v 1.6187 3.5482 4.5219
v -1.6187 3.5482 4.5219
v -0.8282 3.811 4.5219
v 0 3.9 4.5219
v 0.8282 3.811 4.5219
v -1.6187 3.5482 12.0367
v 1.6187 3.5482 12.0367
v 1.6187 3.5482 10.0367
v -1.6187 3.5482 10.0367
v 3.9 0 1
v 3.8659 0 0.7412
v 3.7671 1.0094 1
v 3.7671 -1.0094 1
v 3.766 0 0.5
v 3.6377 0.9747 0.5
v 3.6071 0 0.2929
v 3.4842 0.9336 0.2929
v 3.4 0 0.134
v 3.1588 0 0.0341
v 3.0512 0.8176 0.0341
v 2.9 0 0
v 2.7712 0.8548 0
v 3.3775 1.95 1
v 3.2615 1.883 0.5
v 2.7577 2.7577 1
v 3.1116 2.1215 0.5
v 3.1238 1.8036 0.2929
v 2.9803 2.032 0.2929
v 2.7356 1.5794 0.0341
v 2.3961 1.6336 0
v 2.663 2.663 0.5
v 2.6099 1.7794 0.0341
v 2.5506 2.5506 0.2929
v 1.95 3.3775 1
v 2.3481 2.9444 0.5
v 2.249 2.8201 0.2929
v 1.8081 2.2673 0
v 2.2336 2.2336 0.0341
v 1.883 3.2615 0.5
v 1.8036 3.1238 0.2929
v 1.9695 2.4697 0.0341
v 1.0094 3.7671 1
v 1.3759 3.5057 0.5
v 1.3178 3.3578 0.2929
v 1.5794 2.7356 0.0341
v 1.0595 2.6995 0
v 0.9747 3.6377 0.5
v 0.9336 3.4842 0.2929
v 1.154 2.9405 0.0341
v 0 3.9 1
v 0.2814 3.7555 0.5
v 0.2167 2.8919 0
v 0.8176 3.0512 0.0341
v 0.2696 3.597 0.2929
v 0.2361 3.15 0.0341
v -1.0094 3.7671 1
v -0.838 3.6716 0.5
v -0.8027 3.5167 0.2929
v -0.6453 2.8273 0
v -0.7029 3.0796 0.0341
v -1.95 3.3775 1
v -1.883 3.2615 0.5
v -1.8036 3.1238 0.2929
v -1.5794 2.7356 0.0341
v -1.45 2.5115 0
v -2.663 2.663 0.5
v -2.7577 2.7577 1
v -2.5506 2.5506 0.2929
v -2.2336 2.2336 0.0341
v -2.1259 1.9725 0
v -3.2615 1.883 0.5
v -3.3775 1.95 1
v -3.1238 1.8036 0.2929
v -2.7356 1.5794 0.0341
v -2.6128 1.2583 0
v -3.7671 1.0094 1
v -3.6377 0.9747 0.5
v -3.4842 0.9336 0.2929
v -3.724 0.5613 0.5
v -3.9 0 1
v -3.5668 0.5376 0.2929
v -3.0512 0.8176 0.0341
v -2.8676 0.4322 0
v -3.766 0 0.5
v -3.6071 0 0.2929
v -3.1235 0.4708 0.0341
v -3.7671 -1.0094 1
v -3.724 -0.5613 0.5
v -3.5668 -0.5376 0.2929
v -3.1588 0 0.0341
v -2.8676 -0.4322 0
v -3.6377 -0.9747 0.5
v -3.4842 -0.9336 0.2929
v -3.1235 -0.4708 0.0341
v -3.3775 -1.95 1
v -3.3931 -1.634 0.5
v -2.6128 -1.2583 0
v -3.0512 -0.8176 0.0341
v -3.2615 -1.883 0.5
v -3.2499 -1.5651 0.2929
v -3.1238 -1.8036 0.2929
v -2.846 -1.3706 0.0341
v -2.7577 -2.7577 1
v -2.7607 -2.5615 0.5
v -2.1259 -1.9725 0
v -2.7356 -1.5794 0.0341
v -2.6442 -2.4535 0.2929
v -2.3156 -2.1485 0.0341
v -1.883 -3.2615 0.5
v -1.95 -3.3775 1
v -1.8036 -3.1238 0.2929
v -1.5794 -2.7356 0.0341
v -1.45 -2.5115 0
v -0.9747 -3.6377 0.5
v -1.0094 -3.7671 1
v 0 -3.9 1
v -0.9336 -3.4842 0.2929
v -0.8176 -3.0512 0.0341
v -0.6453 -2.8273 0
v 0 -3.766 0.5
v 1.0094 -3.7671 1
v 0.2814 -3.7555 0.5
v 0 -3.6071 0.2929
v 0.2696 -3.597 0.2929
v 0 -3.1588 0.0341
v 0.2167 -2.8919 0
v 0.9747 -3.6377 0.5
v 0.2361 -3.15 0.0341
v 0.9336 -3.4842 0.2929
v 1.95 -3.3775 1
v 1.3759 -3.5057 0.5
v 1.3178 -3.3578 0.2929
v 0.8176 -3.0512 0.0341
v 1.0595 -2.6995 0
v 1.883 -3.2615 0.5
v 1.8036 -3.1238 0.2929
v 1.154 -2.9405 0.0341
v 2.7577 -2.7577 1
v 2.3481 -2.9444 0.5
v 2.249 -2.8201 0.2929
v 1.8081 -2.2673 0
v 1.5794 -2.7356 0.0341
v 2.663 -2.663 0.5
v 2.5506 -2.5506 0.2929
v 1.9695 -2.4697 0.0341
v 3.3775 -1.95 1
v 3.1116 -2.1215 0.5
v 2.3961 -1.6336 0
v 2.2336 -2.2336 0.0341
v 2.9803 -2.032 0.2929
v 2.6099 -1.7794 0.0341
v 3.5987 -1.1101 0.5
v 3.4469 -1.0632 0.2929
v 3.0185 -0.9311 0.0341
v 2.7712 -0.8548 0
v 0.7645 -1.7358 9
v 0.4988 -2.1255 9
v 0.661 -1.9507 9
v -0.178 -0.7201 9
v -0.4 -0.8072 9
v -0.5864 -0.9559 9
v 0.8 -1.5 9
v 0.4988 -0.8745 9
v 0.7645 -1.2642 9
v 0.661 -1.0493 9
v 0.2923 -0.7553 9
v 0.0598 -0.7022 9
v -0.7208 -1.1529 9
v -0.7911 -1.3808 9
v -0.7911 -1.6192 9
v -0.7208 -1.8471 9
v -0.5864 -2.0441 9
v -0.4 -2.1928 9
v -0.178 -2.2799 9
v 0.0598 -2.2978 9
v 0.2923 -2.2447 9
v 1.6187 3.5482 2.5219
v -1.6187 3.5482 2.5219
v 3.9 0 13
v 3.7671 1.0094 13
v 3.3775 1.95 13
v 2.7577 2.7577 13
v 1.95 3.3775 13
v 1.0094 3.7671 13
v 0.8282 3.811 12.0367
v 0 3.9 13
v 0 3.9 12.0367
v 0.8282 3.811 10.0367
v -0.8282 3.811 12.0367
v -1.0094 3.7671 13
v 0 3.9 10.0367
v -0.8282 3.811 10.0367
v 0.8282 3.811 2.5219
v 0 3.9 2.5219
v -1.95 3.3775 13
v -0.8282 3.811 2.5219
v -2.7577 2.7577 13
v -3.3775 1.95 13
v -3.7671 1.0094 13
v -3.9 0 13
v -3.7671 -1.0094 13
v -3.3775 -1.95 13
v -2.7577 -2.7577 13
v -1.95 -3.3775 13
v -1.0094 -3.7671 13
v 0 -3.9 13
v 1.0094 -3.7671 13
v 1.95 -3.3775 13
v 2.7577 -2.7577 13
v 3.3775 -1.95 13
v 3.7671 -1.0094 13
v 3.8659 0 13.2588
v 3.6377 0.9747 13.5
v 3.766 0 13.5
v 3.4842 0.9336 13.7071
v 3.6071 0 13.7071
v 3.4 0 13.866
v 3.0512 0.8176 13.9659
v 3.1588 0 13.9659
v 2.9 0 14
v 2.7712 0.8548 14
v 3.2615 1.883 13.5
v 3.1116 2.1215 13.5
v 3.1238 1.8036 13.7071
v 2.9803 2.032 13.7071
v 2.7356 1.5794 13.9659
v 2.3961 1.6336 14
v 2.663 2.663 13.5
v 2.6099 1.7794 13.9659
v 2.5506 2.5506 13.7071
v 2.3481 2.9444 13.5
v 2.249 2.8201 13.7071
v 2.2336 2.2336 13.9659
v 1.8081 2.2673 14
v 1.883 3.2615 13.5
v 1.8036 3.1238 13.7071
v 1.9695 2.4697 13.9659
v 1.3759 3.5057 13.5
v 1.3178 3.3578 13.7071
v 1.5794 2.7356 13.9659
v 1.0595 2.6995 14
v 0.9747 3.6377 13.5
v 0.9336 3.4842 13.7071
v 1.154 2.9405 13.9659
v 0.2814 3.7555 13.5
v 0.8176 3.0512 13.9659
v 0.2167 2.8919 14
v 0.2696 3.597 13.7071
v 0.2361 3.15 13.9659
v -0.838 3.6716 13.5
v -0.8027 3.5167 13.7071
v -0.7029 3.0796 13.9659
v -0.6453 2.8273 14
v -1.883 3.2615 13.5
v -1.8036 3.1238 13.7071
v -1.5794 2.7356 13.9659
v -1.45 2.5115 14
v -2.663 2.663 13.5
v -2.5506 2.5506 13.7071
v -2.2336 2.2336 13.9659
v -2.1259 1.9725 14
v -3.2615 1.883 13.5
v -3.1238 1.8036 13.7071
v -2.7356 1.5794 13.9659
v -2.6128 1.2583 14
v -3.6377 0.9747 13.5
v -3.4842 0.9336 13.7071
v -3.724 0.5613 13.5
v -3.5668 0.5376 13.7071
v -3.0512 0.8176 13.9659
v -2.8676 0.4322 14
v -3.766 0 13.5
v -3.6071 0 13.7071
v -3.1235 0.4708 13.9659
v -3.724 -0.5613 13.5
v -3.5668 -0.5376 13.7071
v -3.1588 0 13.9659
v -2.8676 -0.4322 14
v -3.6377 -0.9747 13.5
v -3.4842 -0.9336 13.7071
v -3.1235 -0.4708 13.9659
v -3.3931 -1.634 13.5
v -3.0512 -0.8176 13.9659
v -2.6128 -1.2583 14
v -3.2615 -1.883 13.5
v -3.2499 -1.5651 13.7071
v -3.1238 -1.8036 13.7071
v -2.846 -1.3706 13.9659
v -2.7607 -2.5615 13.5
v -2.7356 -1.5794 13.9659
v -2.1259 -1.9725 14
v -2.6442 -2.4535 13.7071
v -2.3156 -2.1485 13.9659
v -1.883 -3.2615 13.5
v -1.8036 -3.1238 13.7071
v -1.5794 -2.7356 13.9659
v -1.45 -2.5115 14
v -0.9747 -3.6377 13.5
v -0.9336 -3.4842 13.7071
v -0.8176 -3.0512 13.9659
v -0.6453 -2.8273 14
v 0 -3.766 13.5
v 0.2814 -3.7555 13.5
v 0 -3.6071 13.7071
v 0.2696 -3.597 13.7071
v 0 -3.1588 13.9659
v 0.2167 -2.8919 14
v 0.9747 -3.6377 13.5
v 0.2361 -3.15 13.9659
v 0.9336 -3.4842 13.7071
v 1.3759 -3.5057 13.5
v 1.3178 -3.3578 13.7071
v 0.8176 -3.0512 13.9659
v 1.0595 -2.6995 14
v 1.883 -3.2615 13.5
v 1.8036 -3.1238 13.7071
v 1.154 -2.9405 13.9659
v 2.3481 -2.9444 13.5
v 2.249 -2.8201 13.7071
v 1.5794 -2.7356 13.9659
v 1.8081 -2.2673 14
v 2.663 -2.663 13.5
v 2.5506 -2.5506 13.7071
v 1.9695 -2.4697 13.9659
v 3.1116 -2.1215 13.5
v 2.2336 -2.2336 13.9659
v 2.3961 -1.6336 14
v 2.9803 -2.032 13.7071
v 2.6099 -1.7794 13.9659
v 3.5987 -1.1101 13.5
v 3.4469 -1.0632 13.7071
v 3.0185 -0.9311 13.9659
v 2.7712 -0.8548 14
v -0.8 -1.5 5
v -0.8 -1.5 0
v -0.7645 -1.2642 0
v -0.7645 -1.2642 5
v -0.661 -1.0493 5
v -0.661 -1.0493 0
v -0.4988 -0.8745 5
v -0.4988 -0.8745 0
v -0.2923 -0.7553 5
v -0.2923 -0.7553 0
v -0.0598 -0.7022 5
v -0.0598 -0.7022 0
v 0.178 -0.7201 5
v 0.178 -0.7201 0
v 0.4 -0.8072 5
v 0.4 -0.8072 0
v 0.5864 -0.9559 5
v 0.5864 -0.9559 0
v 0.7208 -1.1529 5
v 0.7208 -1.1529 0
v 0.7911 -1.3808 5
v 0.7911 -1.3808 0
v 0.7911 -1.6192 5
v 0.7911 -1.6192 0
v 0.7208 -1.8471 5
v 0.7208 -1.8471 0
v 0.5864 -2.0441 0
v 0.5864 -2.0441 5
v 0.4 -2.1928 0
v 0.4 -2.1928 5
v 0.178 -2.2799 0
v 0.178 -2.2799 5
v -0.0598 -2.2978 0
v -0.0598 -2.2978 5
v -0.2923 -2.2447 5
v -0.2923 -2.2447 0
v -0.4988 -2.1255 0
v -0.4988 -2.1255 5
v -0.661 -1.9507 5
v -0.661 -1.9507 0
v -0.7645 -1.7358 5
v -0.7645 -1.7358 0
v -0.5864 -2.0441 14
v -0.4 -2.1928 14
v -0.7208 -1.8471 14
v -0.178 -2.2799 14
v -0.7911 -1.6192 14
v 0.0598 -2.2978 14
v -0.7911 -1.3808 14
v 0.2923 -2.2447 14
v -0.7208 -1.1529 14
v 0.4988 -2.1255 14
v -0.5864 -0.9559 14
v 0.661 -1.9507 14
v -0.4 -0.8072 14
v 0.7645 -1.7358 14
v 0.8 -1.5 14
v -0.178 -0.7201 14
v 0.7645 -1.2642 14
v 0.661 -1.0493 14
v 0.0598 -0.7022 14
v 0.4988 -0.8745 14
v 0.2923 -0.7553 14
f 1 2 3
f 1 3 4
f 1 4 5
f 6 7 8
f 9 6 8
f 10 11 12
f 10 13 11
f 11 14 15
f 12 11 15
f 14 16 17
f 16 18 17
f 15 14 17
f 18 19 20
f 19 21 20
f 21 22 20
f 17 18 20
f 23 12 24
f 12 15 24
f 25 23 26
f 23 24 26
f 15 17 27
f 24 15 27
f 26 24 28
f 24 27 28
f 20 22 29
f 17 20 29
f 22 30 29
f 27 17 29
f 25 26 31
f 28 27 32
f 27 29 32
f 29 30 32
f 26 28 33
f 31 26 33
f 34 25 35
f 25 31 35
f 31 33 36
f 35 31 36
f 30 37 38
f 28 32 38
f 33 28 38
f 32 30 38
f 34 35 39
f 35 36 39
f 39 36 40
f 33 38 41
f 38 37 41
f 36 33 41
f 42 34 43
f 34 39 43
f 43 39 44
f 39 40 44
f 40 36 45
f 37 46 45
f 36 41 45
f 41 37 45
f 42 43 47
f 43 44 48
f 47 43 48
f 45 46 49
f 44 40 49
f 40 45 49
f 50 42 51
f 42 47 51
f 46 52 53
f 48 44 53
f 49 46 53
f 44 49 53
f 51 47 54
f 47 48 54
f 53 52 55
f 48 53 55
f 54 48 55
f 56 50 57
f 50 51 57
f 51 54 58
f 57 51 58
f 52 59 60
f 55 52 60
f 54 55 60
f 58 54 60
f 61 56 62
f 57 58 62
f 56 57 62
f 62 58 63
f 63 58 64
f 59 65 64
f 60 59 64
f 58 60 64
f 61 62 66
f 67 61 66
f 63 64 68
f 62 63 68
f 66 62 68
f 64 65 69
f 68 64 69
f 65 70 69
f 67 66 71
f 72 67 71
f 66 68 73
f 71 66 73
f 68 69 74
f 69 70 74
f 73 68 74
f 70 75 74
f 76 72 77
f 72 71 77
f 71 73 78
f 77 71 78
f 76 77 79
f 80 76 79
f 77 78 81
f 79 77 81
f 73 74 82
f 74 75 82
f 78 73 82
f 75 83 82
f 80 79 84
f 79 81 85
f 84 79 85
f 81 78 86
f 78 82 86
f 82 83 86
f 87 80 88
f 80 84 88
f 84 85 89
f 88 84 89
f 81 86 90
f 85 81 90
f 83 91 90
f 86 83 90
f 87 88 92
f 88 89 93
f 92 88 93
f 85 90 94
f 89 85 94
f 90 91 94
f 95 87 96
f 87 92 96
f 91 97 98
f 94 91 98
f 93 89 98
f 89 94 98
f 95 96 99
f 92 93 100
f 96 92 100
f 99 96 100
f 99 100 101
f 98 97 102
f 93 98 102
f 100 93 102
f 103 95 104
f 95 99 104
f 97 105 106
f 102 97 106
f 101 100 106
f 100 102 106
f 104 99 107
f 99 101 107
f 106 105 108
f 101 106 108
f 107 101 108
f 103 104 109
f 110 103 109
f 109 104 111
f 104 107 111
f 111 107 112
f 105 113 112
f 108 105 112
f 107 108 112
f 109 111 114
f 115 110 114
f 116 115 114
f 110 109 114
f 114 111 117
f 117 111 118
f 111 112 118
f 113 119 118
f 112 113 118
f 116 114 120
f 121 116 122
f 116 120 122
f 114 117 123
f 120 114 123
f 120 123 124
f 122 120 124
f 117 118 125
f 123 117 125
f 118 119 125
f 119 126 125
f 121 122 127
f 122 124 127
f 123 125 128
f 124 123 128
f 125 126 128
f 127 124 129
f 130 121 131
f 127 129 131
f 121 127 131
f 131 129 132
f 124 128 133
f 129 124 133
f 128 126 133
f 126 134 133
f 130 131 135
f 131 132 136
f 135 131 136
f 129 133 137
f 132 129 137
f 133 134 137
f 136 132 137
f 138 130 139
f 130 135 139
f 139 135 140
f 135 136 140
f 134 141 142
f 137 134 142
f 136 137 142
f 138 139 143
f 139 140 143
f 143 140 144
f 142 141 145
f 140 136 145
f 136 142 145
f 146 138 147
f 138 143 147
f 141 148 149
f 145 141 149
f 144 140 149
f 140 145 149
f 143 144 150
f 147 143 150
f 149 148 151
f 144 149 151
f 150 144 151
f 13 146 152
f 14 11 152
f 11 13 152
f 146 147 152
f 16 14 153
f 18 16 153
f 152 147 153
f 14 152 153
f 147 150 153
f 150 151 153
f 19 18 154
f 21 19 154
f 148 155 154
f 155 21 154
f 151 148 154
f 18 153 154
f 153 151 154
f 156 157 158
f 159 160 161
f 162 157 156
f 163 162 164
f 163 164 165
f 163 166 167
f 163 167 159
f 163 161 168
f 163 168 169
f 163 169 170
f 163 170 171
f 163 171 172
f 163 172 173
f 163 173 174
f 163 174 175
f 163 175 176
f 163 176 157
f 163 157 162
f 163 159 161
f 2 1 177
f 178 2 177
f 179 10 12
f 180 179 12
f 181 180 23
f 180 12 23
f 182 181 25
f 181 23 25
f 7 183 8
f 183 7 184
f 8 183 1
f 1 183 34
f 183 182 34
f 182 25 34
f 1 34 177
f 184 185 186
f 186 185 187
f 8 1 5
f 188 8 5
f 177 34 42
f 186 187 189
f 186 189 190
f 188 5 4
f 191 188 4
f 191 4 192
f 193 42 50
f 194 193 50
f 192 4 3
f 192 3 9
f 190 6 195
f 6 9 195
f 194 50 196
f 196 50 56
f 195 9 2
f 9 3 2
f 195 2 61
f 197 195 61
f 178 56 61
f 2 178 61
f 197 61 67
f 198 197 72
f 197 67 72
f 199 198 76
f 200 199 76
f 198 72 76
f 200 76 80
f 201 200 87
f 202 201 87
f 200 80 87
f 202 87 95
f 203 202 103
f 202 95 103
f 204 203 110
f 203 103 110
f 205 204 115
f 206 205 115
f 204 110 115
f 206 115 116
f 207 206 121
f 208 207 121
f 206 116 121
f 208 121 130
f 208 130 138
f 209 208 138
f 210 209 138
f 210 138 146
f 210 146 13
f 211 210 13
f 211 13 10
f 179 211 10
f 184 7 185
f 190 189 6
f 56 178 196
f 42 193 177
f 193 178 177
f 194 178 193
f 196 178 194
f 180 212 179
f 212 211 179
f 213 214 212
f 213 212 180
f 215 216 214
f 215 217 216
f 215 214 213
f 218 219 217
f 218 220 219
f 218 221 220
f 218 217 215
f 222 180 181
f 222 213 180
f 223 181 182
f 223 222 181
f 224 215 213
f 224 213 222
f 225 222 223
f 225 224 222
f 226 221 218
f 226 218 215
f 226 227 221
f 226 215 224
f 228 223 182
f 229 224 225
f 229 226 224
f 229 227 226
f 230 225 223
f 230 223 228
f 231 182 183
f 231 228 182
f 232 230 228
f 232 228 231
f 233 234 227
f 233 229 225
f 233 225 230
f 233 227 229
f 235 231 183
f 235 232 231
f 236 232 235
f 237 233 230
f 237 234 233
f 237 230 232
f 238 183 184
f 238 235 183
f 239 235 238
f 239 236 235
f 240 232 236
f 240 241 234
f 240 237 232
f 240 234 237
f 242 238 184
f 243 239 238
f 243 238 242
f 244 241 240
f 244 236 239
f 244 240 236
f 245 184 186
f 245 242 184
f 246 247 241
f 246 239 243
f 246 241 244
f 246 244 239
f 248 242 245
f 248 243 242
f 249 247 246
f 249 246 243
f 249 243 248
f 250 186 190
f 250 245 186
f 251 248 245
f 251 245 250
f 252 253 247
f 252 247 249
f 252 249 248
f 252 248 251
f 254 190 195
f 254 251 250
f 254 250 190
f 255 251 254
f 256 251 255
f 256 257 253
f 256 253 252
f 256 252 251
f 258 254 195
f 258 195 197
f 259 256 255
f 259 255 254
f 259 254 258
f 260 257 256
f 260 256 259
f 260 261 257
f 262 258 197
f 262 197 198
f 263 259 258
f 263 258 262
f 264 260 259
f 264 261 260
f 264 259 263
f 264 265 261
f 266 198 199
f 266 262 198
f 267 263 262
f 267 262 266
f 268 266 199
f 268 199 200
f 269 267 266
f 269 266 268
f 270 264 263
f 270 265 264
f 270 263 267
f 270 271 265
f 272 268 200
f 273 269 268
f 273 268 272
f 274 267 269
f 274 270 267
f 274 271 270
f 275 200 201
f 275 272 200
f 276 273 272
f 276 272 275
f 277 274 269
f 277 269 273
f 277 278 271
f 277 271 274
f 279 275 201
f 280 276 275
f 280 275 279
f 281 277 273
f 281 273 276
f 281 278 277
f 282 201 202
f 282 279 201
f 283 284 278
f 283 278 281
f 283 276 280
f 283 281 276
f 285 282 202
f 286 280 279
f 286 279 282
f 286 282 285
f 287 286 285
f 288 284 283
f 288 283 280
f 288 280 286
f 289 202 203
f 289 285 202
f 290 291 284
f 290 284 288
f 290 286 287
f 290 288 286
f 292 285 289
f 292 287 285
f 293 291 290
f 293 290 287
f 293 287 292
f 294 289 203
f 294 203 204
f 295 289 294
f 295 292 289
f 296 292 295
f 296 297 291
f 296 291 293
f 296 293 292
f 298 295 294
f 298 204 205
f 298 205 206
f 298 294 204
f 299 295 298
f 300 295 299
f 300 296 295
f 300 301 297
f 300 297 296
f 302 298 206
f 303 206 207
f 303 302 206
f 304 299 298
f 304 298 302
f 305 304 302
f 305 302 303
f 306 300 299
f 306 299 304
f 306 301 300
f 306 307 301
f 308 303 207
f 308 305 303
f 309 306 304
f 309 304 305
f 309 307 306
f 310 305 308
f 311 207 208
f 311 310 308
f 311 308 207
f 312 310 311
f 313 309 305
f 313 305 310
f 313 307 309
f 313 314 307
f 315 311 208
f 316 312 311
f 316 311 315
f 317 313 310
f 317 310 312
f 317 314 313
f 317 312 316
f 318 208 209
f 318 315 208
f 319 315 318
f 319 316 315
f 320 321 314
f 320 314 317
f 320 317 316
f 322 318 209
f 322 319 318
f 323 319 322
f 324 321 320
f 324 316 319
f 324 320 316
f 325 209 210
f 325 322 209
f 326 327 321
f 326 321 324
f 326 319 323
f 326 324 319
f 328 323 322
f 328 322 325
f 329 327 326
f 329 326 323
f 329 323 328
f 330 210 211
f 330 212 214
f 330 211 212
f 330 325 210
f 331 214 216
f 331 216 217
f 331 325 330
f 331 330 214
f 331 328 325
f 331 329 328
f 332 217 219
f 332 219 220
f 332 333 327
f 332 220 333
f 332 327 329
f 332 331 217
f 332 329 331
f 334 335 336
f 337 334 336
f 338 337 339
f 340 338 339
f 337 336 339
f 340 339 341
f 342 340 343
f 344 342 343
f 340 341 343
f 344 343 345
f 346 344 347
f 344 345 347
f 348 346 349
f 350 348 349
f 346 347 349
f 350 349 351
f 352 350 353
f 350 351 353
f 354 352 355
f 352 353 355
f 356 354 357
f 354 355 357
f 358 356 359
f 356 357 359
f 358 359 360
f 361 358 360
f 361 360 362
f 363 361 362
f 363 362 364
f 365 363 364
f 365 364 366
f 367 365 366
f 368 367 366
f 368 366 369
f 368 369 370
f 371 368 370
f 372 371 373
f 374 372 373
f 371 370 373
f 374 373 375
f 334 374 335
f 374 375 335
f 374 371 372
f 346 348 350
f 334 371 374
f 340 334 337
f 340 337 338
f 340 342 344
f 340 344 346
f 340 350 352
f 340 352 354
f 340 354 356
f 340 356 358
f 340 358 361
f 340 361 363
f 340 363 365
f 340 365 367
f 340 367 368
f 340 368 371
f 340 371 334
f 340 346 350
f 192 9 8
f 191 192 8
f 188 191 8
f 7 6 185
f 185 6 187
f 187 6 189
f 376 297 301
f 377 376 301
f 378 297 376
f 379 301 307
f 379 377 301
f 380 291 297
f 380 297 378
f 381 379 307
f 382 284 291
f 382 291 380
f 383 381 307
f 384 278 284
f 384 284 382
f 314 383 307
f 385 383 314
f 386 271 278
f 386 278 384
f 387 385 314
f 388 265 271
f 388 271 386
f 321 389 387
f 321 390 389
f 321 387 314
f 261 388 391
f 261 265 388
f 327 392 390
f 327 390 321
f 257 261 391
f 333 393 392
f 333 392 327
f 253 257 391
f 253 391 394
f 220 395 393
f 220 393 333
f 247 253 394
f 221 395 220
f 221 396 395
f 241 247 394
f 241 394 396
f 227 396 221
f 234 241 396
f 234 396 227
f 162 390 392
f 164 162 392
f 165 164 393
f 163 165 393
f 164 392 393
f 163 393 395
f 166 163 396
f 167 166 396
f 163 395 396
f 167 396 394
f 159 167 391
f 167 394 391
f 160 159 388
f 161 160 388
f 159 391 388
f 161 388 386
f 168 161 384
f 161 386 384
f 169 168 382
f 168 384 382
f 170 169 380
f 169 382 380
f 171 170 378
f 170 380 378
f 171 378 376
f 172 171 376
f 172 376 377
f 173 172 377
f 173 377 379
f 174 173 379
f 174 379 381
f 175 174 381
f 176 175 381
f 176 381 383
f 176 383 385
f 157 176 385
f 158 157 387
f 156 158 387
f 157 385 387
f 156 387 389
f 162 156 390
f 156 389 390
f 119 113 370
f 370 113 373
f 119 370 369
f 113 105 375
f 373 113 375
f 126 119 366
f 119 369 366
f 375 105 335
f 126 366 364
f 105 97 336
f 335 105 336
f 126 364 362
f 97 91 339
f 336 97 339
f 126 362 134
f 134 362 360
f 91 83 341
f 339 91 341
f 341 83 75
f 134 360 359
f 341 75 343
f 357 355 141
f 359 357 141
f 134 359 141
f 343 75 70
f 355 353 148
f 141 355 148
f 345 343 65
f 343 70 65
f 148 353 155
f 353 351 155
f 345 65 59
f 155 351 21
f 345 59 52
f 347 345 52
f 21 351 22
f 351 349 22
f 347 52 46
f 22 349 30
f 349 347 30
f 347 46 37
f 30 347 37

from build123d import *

# Parameters (mm, degrees)
SKETCH1_R               = 3.9
BOSS_EXTRUDE1_DEPTH     = 14
FILLET1_R               = 1
SKETCH2_R               = 0.8
CUT_EXTRUDE1_DEPTH      = 5
CUT_EXTRUDE2_START      = -5
SKETCH3_R               = 0.8
CUT_EXTRUDE2_DEPTH      = 5
CUT_EXTRUDE3_DEPTH      = 5
CUT_EXTRUDE3_DEPTH_BACK = 5
SKETCH4_W               = 2
SKETCH4_H               = 0.351785614
CUT_EXTRUDE4_DEPTH      = 10
CUT_EXTRUDE4_DEPTH_BACK = 10
SKETCH7_W               = 2
SKETCH7_H               = 1.401254955


with BuildPart() as part:
    # Sketch1 → Boss-Extrude1 (new body)
    with BuildSketch(Plane.XY):
        Circle(SKETCH1_R)
    extrude(amount=BOSS_EXTRUDE1_DEPTH)

    # Fillet1
    fillet1_edges = [part.edges().sort_by_distance(p)[0] for p in [
        (-3.9, 0, 14),
        (-3.9, 0, 0),
    ]]
    fillet(fillet1_edges, radius=FILLET1_R)

    # Sketch2 → Cut-Extrude1 (cut)
    with BuildSketch(Plane.XY.offset(14)):
        with Locations((0, -1.5)):
            Circle(SKETCH2_R)
    extrude(amount=-CUT_EXTRUDE1_DEPTH, mode=Mode.SUBTRACT)

    # Sketch3 → Cut-Extrude2 (cut)
    with BuildSketch(Plane(origin=(0, 0, 0), x_dir=(-1, 0, 0), z_dir=(0, 0, -1)).offset(CUT_EXTRUDE2_START)):
        with Locations((0, -1.5)):
            Circle(SKETCH3_R)
    extrude(amount=CUT_EXTRUDE2_DEPTH, mode=Mode.SUBTRACT)

    # Sketch4 → Cut-Extrude3 (cut, two sides: drawn at the far end of the back side and taken through both)
    with BuildSketch(Plane(origin=(0, 0, 0), x_dir=(0, 0, -1), z_dir=(1, 0, 0)).offset(-CUT_EXTRUDE3_DEPTH_BACK)):
        with Locations((-3.521882016, 3.724107193)):
            Rectangle(SKETCH4_W, SKETCH4_H)
    extrude(amount=CUT_EXTRUDE3_DEPTH + CUT_EXTRUDE3_DEPTH_BACK, mode=Mode.SUBTRACT)

    # Sketch7 → Cut-Extrude4 (cut, two sides: drawn at the far end of the back side and taken through both)
    with BuildSketch(Plane(origin=(0, 0, 0), x_dir=(0, 0, -1), z_dir=(1, 0, 0)).offset(-CUT_EXTRUDE4_DEPTH_BACK)):
        with Locations((-11.03673309, 4.248841864)):
            Rectangle(SKETCH7_W, SKETCH7_H)
    extrude(amount=CUT_EXTRUDE4_DEPTH + CUT_EXTRUDE4_DEPTH_BACK, mode=Mode.SUBTRACT)


solid = part.part
